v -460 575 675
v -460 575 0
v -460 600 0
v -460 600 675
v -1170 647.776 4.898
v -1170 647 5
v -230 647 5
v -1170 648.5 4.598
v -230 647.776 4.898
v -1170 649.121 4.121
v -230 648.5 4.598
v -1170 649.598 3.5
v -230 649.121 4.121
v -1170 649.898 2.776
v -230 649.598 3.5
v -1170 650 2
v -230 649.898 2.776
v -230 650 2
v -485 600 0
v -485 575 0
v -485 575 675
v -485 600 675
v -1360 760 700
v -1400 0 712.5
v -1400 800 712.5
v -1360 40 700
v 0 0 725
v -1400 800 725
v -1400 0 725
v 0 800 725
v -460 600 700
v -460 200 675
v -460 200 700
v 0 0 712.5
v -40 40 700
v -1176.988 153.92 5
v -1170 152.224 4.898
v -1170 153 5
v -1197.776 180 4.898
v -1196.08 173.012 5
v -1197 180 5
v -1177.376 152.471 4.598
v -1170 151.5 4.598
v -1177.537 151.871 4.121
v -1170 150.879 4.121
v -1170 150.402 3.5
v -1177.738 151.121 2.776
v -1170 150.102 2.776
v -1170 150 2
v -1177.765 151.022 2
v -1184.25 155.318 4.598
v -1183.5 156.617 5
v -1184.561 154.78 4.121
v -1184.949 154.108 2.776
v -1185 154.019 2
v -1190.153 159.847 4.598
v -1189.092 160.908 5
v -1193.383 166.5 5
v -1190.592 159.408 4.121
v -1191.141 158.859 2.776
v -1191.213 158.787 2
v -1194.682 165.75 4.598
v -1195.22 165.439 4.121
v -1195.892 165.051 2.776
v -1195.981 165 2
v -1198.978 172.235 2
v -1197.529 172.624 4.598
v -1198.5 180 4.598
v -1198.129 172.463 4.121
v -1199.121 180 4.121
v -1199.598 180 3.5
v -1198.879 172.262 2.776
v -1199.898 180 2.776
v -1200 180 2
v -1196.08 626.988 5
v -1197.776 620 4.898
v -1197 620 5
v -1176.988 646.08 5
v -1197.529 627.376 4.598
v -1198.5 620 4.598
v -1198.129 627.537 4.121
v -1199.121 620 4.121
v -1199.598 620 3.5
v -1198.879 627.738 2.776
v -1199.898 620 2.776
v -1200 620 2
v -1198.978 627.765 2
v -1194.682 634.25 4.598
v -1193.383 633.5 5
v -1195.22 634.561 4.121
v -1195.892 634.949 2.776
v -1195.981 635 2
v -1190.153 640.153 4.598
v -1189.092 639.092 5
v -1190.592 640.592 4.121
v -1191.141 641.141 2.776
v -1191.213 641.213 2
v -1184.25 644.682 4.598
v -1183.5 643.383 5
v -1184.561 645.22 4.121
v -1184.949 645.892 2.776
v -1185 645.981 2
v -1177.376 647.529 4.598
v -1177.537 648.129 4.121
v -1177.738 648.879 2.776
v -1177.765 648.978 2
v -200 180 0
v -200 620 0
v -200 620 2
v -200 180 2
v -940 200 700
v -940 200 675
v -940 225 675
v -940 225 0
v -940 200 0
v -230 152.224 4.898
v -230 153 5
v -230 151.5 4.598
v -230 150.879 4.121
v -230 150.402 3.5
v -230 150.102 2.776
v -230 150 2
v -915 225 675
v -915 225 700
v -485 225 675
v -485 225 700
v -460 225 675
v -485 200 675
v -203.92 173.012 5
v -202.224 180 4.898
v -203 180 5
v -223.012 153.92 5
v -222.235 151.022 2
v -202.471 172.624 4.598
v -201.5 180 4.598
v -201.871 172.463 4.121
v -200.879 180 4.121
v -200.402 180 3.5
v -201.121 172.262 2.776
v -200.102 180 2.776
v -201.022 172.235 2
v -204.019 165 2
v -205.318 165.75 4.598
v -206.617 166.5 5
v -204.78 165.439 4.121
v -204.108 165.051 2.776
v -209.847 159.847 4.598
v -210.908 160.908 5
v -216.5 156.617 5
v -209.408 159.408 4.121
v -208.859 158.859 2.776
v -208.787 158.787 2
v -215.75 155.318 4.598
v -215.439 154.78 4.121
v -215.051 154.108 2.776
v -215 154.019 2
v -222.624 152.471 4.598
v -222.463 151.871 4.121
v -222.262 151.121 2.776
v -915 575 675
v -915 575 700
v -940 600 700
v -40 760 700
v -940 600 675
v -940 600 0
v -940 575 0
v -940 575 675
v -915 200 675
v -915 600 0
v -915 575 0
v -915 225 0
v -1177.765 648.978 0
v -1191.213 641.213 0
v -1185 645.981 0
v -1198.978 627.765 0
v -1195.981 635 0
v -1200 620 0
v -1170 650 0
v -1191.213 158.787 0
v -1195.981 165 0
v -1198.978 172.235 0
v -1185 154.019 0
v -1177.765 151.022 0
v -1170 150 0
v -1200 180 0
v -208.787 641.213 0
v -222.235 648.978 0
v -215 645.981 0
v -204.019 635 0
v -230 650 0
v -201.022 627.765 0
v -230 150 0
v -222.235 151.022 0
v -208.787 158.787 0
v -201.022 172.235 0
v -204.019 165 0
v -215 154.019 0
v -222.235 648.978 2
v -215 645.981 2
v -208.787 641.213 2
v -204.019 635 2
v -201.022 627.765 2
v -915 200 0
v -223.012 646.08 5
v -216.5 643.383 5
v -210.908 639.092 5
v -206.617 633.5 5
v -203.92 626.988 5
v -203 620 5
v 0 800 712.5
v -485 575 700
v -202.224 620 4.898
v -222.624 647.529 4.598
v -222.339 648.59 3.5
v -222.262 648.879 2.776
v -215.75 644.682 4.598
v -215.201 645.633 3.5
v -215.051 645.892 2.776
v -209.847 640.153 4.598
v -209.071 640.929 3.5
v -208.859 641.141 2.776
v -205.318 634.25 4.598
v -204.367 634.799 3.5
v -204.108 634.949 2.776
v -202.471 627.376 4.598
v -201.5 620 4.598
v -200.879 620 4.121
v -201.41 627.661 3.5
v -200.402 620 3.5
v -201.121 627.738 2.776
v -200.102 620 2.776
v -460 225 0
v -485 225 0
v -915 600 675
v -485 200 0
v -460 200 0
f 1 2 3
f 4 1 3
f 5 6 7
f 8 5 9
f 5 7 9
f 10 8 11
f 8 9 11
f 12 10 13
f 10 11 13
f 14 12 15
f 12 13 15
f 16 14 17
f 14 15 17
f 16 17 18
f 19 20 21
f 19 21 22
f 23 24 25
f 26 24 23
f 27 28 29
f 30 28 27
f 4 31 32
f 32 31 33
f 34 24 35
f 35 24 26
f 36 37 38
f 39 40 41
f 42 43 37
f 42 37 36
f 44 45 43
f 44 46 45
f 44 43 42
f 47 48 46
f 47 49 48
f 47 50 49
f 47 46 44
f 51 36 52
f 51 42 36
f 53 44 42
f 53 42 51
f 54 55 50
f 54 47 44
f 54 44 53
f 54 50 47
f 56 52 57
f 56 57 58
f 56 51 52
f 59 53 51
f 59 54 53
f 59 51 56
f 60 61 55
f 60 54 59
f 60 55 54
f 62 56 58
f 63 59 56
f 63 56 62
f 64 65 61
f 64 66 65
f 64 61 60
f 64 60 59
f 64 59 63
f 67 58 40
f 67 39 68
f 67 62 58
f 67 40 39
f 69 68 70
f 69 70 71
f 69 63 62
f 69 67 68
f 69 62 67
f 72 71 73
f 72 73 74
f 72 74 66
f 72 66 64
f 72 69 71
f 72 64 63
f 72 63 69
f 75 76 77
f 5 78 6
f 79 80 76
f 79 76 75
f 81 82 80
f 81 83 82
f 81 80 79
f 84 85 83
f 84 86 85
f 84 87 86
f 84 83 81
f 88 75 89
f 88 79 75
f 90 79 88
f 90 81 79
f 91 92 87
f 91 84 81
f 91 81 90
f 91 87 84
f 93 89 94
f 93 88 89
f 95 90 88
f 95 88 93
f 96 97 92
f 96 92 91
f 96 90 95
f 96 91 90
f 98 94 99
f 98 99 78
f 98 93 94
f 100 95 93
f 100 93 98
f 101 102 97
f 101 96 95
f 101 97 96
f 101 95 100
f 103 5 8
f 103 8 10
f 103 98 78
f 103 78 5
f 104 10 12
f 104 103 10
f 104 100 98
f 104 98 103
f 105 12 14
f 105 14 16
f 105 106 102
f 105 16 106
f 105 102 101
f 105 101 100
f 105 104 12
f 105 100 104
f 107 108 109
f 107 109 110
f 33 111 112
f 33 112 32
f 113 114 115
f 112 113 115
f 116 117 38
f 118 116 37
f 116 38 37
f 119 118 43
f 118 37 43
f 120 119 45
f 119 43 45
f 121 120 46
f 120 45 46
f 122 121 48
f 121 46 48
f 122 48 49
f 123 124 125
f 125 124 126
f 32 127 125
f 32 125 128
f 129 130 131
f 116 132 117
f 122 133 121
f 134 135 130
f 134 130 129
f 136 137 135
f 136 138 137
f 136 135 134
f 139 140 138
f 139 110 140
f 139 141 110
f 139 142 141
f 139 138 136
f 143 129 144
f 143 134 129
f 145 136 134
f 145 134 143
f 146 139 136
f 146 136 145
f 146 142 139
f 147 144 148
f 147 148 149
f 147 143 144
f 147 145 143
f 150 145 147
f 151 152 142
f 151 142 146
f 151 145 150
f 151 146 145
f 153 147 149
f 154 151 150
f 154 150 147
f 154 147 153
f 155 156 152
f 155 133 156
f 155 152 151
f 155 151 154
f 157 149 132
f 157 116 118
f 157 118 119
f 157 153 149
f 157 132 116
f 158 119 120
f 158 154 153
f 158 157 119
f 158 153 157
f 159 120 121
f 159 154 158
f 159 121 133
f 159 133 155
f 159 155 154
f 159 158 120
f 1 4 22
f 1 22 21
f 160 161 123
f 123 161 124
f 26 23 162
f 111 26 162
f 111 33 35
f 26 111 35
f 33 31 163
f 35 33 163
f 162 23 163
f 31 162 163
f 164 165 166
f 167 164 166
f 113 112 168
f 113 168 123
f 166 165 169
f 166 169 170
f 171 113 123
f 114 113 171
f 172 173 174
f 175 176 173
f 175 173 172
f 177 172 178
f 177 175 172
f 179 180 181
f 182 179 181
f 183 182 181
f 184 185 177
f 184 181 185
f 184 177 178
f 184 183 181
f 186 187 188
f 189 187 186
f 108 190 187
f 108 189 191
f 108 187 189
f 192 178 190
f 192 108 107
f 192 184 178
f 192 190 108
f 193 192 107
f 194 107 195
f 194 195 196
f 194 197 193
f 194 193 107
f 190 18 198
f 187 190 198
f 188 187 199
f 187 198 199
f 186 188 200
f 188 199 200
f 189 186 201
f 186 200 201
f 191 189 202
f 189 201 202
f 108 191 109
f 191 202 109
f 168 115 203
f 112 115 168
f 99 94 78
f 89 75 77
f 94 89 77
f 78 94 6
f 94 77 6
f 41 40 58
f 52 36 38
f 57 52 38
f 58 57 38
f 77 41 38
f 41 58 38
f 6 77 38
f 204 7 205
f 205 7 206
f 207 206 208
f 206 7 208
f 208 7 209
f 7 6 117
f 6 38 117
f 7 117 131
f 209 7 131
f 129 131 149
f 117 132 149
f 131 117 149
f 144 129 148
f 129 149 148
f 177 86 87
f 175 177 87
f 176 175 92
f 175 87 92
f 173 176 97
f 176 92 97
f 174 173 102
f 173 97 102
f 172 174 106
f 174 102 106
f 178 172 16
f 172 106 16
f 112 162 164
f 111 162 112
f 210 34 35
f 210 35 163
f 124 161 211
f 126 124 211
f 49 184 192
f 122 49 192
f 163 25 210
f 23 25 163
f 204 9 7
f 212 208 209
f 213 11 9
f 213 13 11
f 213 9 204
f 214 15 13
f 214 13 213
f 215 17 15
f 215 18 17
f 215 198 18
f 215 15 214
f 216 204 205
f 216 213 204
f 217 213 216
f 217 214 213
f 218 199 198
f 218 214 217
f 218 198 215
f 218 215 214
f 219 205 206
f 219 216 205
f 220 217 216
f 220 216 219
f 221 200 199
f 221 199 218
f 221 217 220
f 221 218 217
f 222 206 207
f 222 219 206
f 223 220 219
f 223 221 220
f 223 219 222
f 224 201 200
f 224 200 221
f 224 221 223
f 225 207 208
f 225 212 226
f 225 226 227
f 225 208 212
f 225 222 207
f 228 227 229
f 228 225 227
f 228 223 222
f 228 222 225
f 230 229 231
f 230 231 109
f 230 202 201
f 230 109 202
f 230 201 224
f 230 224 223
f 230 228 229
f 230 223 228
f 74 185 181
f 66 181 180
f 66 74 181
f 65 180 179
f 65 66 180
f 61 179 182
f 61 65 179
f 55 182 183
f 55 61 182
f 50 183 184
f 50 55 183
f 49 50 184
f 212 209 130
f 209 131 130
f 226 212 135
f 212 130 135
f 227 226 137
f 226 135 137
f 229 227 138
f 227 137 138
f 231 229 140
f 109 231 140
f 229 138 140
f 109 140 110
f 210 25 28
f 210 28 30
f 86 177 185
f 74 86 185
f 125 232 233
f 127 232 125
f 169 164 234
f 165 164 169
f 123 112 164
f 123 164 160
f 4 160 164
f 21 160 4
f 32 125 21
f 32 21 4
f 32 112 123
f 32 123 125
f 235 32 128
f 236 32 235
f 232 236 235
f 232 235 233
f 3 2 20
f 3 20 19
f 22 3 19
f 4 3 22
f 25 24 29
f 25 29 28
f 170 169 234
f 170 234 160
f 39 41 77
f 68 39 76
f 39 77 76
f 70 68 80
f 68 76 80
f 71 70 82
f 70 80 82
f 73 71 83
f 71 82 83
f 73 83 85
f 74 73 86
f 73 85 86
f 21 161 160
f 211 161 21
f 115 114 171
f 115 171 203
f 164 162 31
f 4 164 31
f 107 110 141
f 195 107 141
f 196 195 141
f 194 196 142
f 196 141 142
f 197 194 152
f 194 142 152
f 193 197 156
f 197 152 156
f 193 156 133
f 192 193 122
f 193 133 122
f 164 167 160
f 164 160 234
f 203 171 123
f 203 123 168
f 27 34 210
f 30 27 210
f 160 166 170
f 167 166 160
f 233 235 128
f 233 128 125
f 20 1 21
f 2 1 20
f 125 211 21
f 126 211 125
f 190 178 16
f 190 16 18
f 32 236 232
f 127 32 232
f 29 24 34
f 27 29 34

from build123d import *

# Parameters (mm, degrees)
F1_W      = 1400
F1_H      = 800
F2_DEPTH  = 25
F3_SIZE2  = 12.5
F3_SIZE   = 40
F5_W      = 480
F5_H      = 400
F5_W_2    = 430
F5_H_2    = 350
F6_DEPTH  = 25
F9_DEPTH  = 25
F12_DEPTH = 25
F14_W     = 1000
F14_H     = 500
F15_DEPTH = 5
F16_R     = 30
F17_R     = 3


with BuildPart() as f2:
    # F1 (on offset) → F2 (new body)
    with BuildSketch(Plane.XY.offset(700)):
        with Locations((-700, 400)):
            Rectangle(F1_W, F1_H)
    extrude(amount=F2_DEPTH)

    # F3
    f3_edges = [f2.edges().sort_by_distance(p)[0] for p in [
        (-700, 0, 700),
        (0, 400, 700),
        (-700, 800, 700),
        (-1400, 400, 700),
    ]]
    f3_side = f2.faces().sort_by_distance((-700, 400, 700))[0]
    chamfer(f3_edges, length=F3_SIZE, length2=F3_SIZE2, reference=f3_side)

    # F5 (on offset) → F6 (join)
    with BuildSketch(Plane(origin=(0, 0, 700), x_dir=(1, 0, 0), z_dir=(0, 0, -1))):
        with Locations((-700, -400)):
            Rectangle(F5_W, F5_H)
        with Locations((-700, -400)):
            Rectangle(F5_W_2, F5_H_2, mode=Mode.SUBTRACT)
    extrude(amount=F6_DEPTH)


with BuildPart() as f9:
    # F8 (on offset) → F9 (new body)
    with BuildSketch(Plane.YZ.offset(-460)):
        Polygon((575, 25), (575, 0), (600, 0), (600, 675), (575, 675), (575, 650), align=None)
    extrude(amount=-F9_DEPTH)


with BuildPart() as f9b:
    # F8 (on offset) → F9, piece 2 (new body)
    with BuildSketch(Plane.YZ.offset(-460)):
        Polygon((225, 675), (200, 675), (200, 0), (225, 0), (225, 25), (225, 650), align=None)
    extrude(amount=-F9_DEPTH)


with BuildPart() as f12:
    # F11 (on offset) → F12 (new body)
    with BuildSketch(Plane(origin=(-940, 0, 0), x_dir=(0, -1, 0), z_dir=(-1, 0, 0))):
        Polygon((-600, 0), (-575, 0), (-575, 25), (-575, 675), (-600, 675), align=None)
    extrude(amount=-F12_DEPTH)


with BuildPart() as f12b:
    # F11 (on offset) → F12, piece 2 (new body)
    with BuildSketch(Plane(origin=(-940, 0, 0), x_dir=(0, -1, 0), z_dir=(-1, 0, 0))):
        Polygon((-225, 0), (-200, 0), (-200, 675), (-225, 675), (-225, 25), align=None)
    extrude(amount=-F12_DEPTH)


with BuildPart() as f15:
    # F14 (on offset) → F15 (new body)
    with BuildSketch(Plane(origin=(0, 0, 0), x_dir=(1, 0, 0), z_dir=(0, 0, -1))):
        with Locations((-700, -400)):
            Rectangle(F14_W, F14_H)
    extrude(amount=-F15_DEPTH)

    # F16
    f16_edges = [f15.edges().sort_by_distance(p)[0] for p in [
        (-1200, 150, 2.5),
        (-1200, 650, 2.5),
        (-200, 650, 2.5),
        (-200, 150, 2.5),
    ]]
    fillet(f16_edges, radius=F16_R)

    # F17
    f17_edges = [f15.edges().sort_by_distance(p)[0] for p in [
        (-200, 400, 5),
        (-208.786797, 641.213203, 5),
        (-700, 650, 5),
        (-1191.213203, 641.213203, 5),
        (-1200, 400, 5),
        (-700, 150, 5),
        (-208.786797, 158.786797, 5),
        (-1191.213203, 158.786797, 5),
    ]]
    fillet(f17_edges, radius=F17_R)


solid = Compound([f2.part, f9.part, f9b.part, f12.part, f12b.part, f15.part])
